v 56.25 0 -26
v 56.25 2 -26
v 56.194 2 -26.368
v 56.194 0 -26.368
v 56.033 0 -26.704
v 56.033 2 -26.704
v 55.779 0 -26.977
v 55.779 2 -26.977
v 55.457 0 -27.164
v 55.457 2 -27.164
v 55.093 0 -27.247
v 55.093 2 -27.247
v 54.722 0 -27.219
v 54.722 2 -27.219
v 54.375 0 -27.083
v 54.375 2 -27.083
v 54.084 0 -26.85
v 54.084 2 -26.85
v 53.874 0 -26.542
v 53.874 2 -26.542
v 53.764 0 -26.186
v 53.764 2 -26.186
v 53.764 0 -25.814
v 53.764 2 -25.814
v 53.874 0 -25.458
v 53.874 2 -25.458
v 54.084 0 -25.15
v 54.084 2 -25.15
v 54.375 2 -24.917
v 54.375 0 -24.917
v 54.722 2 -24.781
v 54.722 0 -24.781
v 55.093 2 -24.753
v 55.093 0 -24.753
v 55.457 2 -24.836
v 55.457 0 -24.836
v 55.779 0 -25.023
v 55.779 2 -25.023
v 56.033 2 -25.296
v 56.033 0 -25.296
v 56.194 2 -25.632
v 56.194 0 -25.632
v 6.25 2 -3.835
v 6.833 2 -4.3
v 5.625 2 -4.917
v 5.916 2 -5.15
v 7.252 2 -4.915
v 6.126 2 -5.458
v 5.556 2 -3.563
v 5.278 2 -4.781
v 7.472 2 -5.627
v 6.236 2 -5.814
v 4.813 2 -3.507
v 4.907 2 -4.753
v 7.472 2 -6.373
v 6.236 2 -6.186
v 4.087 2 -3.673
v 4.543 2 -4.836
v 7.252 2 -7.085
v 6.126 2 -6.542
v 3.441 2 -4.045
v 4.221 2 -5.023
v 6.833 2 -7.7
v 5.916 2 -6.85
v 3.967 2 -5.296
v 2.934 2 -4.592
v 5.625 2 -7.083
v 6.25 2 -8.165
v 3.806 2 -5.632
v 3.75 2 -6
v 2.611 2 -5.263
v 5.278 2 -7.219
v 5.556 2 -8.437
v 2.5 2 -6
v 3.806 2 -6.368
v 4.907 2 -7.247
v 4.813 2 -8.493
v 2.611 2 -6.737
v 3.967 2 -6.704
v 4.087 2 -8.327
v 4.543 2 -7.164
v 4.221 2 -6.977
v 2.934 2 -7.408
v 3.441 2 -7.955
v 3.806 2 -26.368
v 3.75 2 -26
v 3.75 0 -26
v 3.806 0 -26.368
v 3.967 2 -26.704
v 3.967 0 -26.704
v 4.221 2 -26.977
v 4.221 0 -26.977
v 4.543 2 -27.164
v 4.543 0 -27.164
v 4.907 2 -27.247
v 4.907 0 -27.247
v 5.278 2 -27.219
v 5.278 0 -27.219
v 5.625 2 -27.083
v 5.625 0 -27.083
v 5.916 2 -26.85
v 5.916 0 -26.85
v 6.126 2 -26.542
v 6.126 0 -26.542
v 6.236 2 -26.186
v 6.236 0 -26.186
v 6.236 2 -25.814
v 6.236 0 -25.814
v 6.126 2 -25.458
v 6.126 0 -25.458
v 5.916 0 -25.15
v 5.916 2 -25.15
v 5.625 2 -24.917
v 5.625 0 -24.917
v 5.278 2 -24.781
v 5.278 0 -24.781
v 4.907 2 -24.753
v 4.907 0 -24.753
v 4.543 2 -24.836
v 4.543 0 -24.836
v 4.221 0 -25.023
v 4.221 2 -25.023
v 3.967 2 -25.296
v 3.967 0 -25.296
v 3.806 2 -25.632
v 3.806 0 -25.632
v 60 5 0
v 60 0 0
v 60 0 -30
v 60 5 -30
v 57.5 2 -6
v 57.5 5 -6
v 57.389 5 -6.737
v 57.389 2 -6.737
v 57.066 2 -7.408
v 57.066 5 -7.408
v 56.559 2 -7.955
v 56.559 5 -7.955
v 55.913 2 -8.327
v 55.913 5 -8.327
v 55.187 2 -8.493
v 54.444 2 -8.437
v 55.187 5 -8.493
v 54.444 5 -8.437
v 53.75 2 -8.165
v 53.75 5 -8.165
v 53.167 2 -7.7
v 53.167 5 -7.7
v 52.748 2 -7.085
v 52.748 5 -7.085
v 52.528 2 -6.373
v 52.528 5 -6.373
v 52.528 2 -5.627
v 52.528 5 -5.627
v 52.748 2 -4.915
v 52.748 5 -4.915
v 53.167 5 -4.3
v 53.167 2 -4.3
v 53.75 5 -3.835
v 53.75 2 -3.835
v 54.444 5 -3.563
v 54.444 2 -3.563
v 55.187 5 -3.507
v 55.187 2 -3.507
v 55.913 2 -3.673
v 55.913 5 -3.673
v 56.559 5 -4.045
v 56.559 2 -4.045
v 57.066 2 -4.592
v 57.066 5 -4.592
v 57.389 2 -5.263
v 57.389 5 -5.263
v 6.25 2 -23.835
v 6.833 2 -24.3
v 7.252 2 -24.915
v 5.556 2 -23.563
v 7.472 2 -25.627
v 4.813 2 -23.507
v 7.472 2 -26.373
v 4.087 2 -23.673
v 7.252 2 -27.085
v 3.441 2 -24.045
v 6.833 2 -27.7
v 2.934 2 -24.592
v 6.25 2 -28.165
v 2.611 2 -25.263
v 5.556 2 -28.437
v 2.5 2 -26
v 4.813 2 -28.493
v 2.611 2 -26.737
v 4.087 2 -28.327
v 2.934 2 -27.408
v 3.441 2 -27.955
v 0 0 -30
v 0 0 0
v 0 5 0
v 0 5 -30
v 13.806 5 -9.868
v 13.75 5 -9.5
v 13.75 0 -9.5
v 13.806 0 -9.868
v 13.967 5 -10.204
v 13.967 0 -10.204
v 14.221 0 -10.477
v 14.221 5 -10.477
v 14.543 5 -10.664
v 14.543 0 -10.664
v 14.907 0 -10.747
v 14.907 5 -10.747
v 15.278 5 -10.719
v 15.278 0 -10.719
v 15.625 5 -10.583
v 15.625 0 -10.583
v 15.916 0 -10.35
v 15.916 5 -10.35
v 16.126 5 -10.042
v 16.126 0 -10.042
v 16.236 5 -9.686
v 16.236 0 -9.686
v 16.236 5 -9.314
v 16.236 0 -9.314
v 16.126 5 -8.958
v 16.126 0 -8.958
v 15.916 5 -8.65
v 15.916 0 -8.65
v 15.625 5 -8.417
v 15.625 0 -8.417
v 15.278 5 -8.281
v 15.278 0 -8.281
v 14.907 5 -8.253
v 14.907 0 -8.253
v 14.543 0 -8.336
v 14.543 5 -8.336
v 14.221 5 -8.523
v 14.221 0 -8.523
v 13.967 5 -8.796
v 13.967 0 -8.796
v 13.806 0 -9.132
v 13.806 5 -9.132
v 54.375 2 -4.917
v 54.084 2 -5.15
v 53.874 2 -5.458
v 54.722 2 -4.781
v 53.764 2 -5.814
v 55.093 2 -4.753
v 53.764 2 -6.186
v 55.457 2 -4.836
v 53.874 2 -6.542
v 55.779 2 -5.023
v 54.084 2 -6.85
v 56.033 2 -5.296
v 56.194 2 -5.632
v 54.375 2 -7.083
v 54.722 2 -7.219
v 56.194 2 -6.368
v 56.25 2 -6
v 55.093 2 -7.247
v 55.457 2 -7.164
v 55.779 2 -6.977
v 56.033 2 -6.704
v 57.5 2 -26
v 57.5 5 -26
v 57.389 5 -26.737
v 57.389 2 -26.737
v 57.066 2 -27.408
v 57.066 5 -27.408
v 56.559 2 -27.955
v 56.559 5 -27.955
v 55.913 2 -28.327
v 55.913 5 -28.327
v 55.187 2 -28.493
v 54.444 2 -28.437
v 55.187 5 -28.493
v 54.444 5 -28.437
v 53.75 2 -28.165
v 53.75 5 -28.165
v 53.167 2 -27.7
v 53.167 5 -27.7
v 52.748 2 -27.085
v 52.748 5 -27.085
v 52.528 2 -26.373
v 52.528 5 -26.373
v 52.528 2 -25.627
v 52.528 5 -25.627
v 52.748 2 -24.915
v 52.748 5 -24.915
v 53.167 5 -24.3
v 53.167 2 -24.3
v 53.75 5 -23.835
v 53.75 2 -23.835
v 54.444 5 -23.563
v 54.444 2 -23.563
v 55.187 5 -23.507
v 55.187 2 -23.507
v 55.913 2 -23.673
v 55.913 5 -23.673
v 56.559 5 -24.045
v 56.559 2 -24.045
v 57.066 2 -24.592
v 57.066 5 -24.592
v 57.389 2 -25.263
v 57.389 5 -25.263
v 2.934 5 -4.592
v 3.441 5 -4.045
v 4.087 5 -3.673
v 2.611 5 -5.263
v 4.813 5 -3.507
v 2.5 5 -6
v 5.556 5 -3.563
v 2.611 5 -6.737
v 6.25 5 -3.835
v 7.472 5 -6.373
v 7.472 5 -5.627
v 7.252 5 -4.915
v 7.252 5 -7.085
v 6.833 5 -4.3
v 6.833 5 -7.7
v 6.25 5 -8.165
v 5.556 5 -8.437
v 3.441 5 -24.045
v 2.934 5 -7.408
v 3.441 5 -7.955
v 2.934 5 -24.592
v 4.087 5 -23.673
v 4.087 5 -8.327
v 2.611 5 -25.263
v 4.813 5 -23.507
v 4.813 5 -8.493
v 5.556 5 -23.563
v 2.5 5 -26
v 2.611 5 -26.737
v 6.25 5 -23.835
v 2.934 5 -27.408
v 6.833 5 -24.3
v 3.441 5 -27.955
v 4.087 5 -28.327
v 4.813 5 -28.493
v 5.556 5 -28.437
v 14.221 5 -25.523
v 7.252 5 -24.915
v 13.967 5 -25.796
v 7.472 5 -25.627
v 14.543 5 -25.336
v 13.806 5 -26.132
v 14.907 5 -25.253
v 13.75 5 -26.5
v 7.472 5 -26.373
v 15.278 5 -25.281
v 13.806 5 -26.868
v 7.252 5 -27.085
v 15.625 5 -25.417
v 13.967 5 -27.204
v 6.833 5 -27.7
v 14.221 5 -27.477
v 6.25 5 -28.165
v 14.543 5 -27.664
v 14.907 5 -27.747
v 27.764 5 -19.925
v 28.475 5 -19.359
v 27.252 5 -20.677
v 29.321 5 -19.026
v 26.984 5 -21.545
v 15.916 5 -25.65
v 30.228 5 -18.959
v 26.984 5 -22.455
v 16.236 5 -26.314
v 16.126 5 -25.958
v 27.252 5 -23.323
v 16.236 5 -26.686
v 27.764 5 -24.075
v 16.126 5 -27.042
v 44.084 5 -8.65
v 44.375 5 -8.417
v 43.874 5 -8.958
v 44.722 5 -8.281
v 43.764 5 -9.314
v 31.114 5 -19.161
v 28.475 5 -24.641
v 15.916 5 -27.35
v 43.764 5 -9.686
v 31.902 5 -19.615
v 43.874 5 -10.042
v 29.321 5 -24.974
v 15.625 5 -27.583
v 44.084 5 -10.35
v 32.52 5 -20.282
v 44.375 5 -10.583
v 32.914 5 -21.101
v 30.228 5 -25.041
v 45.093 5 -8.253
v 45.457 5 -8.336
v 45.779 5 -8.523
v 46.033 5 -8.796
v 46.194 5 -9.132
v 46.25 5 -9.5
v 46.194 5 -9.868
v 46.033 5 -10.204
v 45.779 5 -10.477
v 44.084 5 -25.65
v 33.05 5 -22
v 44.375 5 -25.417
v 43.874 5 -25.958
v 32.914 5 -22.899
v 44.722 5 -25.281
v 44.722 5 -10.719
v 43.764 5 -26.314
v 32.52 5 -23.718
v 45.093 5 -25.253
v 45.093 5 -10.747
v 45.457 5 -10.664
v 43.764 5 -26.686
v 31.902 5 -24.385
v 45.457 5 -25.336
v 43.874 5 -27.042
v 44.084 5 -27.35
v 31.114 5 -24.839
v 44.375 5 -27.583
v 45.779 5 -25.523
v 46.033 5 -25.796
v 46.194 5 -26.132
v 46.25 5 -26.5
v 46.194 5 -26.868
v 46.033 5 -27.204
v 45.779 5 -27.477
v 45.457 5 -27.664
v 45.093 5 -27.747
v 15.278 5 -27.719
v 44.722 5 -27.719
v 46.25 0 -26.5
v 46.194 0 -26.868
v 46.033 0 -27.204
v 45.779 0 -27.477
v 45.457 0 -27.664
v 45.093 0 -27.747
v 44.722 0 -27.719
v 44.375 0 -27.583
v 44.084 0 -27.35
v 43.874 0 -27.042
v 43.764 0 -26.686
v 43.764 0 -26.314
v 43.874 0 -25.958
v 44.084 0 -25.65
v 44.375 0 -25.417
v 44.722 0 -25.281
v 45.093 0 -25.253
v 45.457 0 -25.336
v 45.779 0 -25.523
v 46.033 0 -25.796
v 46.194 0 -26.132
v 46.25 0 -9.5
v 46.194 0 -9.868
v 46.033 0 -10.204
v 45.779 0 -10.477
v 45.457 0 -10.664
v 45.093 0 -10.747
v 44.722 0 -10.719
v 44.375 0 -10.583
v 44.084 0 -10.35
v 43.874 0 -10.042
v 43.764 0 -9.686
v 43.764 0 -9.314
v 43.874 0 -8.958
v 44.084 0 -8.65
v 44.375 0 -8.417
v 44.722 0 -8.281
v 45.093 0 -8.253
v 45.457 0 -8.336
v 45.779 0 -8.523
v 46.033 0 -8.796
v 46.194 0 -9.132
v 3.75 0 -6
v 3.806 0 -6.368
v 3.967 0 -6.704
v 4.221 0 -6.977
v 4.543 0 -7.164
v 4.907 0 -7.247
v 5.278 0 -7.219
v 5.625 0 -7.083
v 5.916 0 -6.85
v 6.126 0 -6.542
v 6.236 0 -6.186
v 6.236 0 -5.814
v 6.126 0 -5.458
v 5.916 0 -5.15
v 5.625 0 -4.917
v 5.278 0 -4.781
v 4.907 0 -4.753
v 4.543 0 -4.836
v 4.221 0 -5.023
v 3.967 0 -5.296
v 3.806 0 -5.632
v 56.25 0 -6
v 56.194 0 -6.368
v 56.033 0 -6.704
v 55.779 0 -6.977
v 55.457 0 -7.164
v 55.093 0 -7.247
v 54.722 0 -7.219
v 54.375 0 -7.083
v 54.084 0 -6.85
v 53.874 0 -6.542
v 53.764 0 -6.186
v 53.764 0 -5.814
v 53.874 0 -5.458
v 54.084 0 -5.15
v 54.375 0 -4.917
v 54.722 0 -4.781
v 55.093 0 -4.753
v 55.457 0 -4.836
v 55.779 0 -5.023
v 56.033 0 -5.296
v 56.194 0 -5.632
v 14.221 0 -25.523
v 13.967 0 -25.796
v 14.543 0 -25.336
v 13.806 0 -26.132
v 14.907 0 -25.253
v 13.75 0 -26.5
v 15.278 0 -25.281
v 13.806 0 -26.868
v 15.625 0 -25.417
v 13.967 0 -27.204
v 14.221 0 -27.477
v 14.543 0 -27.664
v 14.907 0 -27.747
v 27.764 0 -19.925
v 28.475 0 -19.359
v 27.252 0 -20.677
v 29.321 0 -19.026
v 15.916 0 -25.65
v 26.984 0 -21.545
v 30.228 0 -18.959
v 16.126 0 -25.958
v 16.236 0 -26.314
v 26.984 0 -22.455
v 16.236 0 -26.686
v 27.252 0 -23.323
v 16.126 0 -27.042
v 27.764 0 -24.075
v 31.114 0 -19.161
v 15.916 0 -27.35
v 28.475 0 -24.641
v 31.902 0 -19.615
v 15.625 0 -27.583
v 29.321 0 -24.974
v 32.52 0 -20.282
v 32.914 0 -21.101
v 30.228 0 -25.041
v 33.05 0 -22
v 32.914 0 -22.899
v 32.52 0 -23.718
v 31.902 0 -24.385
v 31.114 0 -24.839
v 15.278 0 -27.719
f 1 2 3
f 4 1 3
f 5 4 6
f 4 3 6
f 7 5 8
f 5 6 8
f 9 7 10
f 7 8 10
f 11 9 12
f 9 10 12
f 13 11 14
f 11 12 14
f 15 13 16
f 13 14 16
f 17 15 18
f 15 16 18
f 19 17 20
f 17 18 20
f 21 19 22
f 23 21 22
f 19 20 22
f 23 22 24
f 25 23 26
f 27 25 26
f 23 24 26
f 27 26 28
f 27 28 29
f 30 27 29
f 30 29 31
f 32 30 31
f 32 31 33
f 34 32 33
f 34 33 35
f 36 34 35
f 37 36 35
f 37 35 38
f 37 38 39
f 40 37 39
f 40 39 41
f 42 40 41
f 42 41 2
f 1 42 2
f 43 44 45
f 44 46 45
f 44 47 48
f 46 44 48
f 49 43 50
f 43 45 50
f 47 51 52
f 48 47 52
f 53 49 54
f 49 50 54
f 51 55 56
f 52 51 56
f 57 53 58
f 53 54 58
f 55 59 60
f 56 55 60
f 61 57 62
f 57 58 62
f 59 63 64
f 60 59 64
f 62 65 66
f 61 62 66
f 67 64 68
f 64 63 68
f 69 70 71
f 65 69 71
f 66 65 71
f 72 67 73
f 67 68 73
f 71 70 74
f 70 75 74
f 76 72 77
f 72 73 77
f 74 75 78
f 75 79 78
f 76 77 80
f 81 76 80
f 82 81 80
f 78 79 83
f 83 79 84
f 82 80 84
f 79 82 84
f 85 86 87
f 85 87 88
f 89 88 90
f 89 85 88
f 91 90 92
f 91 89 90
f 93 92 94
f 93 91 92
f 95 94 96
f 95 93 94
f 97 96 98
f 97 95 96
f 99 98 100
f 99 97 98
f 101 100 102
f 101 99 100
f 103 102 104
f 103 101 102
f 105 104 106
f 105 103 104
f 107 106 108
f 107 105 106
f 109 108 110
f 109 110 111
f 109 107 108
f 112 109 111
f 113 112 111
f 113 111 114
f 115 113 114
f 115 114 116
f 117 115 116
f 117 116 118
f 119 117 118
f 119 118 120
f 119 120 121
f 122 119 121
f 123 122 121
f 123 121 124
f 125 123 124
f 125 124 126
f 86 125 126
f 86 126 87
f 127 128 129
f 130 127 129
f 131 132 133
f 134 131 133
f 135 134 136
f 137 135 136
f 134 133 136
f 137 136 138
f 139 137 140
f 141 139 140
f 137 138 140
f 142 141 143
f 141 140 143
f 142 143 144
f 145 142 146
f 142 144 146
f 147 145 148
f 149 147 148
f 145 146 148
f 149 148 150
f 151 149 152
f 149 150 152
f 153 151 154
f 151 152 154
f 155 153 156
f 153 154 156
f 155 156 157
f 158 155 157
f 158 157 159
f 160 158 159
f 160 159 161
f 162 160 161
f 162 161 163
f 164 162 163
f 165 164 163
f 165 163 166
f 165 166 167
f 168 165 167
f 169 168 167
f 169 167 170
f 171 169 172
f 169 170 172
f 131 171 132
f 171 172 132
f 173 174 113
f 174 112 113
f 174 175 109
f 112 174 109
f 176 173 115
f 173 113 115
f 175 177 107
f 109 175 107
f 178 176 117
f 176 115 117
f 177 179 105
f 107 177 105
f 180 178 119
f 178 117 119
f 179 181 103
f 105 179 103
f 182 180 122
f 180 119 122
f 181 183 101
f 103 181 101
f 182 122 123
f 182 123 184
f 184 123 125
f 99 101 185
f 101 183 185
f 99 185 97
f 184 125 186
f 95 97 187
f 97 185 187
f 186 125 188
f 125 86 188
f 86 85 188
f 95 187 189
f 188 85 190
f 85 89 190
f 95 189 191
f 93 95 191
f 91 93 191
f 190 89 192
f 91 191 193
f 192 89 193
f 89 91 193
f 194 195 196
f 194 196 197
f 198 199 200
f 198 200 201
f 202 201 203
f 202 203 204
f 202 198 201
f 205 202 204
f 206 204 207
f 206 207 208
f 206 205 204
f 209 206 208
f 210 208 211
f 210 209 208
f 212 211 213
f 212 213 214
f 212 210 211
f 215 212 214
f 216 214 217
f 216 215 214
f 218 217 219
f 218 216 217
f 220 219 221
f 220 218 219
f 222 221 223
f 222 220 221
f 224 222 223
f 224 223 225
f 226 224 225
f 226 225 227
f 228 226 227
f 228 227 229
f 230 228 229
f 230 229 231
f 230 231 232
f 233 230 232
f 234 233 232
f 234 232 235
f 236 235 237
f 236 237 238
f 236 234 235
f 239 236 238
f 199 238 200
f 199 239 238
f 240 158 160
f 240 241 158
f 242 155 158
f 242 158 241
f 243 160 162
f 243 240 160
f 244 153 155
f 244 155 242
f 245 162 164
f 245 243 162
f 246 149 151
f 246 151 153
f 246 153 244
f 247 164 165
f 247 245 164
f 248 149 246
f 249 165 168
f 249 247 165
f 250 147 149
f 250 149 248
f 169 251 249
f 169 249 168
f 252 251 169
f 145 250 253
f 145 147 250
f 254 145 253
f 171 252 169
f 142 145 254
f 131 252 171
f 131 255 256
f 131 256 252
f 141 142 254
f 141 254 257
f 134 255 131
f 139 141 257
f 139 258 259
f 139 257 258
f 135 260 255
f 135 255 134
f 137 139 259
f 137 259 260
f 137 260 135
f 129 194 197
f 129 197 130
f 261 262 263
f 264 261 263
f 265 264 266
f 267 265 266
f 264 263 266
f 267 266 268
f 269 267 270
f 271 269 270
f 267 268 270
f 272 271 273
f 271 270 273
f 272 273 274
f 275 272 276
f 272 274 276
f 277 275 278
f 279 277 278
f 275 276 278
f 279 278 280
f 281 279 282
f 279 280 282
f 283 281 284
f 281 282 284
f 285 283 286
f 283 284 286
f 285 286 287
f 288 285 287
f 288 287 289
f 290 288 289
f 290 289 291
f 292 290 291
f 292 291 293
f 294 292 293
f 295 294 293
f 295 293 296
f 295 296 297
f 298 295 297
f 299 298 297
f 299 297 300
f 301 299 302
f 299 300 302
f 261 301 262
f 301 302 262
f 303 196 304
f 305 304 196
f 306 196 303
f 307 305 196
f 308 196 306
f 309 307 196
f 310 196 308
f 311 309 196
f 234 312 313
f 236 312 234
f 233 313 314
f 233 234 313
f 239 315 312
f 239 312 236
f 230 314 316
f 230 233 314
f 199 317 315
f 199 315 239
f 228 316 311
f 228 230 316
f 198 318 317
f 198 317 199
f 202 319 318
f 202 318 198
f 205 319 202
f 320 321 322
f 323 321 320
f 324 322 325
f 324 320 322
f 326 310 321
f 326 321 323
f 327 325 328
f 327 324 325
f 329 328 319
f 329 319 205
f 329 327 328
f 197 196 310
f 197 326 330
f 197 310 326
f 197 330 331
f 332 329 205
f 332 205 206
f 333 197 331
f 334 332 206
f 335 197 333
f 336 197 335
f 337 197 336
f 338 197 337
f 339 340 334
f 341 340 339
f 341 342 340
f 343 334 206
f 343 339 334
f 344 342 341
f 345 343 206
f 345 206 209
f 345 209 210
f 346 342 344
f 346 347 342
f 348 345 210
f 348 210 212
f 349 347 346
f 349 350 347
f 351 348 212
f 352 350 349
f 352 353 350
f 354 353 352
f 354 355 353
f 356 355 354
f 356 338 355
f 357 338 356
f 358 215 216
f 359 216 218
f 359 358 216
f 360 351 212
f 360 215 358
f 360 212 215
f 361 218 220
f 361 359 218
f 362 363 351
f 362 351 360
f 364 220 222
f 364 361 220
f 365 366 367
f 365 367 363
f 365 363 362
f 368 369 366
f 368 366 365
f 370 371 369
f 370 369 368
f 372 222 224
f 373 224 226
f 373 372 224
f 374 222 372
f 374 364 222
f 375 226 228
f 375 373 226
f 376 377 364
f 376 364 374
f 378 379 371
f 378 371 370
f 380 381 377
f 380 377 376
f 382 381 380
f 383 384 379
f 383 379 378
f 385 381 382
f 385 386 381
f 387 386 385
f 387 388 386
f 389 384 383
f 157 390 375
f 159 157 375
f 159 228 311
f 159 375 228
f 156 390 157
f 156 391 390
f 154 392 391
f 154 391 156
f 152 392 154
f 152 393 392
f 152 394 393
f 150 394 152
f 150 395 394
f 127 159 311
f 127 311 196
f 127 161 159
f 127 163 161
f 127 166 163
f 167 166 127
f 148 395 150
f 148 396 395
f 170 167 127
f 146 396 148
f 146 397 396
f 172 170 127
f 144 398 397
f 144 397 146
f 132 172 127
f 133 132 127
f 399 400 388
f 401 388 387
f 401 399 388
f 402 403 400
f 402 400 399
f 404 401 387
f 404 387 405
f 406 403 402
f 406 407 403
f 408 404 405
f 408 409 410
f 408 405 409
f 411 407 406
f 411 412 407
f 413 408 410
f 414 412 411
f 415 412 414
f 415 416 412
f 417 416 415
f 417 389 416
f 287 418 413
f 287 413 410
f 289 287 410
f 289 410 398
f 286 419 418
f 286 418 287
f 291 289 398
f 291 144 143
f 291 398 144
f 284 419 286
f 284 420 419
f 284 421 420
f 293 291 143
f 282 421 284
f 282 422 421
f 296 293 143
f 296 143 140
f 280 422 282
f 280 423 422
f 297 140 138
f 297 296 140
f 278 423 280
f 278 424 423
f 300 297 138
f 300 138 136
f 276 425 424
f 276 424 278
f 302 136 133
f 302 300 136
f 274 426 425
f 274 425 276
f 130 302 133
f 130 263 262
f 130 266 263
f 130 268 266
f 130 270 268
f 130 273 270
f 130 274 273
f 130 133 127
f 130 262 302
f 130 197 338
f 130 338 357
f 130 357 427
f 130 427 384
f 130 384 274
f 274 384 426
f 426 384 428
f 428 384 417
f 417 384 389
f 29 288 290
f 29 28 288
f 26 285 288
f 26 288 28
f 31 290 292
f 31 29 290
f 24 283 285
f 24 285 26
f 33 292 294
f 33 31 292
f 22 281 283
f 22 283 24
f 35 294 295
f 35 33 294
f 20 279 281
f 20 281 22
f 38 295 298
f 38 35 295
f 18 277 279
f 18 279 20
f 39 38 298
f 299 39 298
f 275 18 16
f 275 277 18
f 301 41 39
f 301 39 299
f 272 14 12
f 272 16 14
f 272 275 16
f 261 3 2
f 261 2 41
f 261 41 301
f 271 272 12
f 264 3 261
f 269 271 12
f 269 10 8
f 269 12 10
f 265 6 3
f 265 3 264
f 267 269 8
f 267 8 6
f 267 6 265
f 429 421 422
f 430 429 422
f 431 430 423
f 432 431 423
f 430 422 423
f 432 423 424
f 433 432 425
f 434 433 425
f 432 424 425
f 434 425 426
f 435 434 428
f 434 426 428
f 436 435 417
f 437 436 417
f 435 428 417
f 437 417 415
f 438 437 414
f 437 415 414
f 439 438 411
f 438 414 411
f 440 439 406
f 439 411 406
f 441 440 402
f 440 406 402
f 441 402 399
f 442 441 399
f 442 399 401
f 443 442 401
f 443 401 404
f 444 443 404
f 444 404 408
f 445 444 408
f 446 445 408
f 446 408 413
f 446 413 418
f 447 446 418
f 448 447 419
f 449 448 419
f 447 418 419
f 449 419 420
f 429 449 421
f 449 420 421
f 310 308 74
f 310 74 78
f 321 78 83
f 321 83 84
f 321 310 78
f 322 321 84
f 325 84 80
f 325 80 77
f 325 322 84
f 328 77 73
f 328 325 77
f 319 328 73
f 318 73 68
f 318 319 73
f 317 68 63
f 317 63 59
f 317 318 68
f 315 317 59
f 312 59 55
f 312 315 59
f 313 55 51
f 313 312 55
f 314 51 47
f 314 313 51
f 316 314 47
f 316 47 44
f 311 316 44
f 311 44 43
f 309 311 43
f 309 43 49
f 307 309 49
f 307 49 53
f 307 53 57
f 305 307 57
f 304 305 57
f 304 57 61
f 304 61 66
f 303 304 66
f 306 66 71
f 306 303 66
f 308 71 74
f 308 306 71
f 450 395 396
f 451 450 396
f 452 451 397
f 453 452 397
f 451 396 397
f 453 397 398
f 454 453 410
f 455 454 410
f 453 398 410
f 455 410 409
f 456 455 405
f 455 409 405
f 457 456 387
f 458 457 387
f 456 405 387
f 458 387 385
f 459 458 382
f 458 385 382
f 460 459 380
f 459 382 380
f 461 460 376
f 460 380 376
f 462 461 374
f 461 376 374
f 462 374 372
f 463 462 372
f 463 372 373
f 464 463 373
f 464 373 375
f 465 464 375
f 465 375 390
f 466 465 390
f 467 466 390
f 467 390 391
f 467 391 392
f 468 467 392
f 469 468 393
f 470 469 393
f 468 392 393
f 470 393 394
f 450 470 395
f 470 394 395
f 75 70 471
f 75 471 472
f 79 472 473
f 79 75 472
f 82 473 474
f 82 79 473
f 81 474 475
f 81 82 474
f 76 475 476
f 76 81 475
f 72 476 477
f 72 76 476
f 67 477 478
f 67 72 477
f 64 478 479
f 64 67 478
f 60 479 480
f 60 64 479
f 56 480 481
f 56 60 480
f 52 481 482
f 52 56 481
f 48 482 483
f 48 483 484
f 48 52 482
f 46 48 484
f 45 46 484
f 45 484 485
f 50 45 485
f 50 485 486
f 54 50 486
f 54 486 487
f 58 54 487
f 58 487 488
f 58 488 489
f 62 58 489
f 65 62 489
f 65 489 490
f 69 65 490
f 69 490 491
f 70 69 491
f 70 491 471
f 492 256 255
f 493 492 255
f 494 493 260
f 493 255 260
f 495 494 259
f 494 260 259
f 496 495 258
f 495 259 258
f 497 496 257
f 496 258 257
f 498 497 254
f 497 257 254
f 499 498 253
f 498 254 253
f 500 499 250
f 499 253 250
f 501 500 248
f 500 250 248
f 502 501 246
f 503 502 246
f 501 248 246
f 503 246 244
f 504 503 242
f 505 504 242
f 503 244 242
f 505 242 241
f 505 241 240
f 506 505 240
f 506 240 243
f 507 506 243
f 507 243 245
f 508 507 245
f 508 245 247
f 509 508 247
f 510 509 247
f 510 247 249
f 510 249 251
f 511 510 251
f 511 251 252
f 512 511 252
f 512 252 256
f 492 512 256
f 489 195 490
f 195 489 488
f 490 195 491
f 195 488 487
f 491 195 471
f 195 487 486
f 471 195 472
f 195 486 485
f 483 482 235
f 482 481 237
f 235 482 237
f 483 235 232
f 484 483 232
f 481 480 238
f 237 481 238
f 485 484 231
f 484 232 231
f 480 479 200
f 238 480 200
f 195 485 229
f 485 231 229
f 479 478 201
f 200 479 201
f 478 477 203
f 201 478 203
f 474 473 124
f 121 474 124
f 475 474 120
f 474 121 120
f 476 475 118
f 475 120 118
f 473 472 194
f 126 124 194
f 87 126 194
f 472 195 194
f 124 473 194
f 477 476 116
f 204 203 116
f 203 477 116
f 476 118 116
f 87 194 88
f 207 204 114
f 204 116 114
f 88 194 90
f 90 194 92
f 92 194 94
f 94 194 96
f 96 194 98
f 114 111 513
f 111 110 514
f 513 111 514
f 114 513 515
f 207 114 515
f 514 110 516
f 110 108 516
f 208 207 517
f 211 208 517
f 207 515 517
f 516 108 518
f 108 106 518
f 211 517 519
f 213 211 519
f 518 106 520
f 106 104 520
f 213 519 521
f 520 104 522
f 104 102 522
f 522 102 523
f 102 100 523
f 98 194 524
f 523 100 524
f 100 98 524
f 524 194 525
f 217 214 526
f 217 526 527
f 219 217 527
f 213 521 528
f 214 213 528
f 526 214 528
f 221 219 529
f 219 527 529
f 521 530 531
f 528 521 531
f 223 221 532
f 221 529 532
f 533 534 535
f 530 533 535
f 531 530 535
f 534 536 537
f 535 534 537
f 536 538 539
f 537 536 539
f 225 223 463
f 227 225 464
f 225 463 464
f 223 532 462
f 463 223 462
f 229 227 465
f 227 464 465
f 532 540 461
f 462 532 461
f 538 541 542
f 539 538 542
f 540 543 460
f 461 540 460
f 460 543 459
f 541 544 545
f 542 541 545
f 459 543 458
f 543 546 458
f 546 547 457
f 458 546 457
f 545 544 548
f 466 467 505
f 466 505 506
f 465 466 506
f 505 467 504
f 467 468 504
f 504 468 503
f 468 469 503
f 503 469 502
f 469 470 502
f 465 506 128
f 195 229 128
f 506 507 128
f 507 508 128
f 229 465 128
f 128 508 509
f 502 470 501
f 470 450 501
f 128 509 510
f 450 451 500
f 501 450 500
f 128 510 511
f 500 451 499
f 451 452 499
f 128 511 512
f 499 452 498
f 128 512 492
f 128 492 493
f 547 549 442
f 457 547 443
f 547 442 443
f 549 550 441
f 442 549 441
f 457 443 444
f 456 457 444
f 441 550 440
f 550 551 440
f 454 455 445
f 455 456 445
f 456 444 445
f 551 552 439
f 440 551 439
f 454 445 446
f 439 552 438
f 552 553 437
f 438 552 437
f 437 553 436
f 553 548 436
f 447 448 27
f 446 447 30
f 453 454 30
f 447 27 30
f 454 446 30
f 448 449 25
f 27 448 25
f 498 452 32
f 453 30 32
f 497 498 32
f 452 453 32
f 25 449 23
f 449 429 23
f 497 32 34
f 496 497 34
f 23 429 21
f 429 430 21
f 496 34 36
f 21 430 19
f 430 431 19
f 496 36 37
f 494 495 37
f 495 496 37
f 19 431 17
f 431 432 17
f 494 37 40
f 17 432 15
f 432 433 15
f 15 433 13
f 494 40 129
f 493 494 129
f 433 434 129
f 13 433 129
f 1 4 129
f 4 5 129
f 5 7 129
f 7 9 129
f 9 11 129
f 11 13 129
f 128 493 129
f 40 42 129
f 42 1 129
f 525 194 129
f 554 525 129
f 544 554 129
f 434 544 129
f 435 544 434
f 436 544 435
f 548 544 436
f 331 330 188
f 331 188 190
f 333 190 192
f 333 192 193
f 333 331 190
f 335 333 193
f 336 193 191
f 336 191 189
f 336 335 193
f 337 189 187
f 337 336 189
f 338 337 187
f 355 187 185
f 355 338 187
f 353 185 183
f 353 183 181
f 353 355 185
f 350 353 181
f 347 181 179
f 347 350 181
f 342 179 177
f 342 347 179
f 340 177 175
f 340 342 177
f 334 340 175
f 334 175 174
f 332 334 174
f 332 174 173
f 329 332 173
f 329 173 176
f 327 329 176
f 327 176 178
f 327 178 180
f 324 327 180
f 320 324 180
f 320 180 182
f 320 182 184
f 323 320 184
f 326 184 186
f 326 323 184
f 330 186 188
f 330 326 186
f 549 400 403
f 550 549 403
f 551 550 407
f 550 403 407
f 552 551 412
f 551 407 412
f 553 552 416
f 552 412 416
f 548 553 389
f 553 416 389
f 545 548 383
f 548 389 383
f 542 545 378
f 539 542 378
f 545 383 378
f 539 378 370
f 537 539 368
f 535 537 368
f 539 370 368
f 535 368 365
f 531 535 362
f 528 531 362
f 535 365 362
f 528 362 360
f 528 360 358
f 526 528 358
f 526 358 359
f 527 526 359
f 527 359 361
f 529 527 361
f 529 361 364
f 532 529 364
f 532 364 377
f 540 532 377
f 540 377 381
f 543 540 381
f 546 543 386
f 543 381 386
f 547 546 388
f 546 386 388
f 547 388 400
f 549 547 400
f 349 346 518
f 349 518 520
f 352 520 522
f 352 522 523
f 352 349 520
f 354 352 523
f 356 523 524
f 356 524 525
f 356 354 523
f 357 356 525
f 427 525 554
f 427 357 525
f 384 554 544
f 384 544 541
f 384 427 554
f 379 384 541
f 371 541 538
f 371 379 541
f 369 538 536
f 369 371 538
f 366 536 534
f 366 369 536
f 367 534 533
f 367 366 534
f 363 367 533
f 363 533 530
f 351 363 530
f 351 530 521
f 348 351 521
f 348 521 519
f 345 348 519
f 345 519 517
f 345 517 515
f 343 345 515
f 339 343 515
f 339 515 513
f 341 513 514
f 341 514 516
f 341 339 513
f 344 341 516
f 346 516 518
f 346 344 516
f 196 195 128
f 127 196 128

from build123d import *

# Parameters (mm, degrees)
SKETCH1_W           = 60
SKETCH1_H           = 30
BOSS_EXTRUDE1_DEPTH = 5
SKETCH2_R           = 3.05
SKETCH2_R_2         = 1.25
CUT_EXTRUDE1_DEPTH  = 5
SKETCH3_R           = 1.25
CUT_EXTRUDE2_DEPTH  = 5
SKETCH4_R           = 2.5
CUT_EXTRUDE3_DEPTH  = 3


with BuildPart() as part:
    # Sketch1 → Boss-Extrude1 (new body)
    with BuildSketch(Plane(origin=(0, 0, 0), x_dir=(1, 0, 0), z_dir=(0, 1, 0))):
        with Locations((30, 15)):
            Rectangle(SKETCH1_W, SKETCH1_H)
    extrude(amount=BOSS_EXTRUDE1_DEPTH)

    # Sketch2 → Cut-Extrude1 (cut)
    with BuildSketch(Plane(origin=(0, 5, 0), x_dir=(1, 0, 0), z_dir=(0, 1, 0))):
        with Locations((30, 22)):
            Circle(SKETCH2_R)
        with Locations((45, 26.5)):
            Circle(SKETCH2_R_2)
        with Locations((45, 9.5)):
            Circle(SKETCH2_R_2)
    cut_extrude1 = extrude(amount=-CUT_EXTRUDE1_DEPTH, mode=Mode.SUBTRACT)

    # Mirror1: Cut-Extrude1 across plane
    add(cut_extrude1.mirror(Plane.ZY.offset(-30)), mode=Mode.SUBTRACT)

    # Sketch3 → Cut-Extrude2 (cut)
    with BuildSketch(Plane(origin=(0, 5, 0), x_dir=(1, 0, 0), z_dir=(0, 1, 0))):
        with Locations((55, 26)):
            Circle(SKETCH3_R)
        with Locations((55, 6)):
            Circle(SKETCH3_R)
    cut_extrude2 = extrude(amount=-CUT_EXTRUDE2_DEPTH, mode=Mode.SUBTRACT)

    # Mirror2: Cut-Extrude2 across plane
    add(cut_extrude2.mirror(Plane.ZY.offset(-30)), mode=Mode.SUBTRACT)

    # Sketch4 → Cut-Extrude3 (cut)
    with BuildSketch(Plane(origin=(0, 5, 0), x_dir=(1, 0, 0), z_dir=(0, 1, 0))):
        with Locations((55, 26)):
            Circle(SKETCH4_R)
        with Locations((55, 6)):
            Circle(SKETCH4_R)
    cut_extrude3 = extrude(amount=-CUT_EXTRUDE3_DEPTH, mode=Mode.SUBTRACT)

    # Mirror3: Cut-Extrude3 across plane
    add(cut_extrude3.mirror(Plane.ZY.offset(-30)), mode=Mode.SUBTRACT)


solid = part.part
